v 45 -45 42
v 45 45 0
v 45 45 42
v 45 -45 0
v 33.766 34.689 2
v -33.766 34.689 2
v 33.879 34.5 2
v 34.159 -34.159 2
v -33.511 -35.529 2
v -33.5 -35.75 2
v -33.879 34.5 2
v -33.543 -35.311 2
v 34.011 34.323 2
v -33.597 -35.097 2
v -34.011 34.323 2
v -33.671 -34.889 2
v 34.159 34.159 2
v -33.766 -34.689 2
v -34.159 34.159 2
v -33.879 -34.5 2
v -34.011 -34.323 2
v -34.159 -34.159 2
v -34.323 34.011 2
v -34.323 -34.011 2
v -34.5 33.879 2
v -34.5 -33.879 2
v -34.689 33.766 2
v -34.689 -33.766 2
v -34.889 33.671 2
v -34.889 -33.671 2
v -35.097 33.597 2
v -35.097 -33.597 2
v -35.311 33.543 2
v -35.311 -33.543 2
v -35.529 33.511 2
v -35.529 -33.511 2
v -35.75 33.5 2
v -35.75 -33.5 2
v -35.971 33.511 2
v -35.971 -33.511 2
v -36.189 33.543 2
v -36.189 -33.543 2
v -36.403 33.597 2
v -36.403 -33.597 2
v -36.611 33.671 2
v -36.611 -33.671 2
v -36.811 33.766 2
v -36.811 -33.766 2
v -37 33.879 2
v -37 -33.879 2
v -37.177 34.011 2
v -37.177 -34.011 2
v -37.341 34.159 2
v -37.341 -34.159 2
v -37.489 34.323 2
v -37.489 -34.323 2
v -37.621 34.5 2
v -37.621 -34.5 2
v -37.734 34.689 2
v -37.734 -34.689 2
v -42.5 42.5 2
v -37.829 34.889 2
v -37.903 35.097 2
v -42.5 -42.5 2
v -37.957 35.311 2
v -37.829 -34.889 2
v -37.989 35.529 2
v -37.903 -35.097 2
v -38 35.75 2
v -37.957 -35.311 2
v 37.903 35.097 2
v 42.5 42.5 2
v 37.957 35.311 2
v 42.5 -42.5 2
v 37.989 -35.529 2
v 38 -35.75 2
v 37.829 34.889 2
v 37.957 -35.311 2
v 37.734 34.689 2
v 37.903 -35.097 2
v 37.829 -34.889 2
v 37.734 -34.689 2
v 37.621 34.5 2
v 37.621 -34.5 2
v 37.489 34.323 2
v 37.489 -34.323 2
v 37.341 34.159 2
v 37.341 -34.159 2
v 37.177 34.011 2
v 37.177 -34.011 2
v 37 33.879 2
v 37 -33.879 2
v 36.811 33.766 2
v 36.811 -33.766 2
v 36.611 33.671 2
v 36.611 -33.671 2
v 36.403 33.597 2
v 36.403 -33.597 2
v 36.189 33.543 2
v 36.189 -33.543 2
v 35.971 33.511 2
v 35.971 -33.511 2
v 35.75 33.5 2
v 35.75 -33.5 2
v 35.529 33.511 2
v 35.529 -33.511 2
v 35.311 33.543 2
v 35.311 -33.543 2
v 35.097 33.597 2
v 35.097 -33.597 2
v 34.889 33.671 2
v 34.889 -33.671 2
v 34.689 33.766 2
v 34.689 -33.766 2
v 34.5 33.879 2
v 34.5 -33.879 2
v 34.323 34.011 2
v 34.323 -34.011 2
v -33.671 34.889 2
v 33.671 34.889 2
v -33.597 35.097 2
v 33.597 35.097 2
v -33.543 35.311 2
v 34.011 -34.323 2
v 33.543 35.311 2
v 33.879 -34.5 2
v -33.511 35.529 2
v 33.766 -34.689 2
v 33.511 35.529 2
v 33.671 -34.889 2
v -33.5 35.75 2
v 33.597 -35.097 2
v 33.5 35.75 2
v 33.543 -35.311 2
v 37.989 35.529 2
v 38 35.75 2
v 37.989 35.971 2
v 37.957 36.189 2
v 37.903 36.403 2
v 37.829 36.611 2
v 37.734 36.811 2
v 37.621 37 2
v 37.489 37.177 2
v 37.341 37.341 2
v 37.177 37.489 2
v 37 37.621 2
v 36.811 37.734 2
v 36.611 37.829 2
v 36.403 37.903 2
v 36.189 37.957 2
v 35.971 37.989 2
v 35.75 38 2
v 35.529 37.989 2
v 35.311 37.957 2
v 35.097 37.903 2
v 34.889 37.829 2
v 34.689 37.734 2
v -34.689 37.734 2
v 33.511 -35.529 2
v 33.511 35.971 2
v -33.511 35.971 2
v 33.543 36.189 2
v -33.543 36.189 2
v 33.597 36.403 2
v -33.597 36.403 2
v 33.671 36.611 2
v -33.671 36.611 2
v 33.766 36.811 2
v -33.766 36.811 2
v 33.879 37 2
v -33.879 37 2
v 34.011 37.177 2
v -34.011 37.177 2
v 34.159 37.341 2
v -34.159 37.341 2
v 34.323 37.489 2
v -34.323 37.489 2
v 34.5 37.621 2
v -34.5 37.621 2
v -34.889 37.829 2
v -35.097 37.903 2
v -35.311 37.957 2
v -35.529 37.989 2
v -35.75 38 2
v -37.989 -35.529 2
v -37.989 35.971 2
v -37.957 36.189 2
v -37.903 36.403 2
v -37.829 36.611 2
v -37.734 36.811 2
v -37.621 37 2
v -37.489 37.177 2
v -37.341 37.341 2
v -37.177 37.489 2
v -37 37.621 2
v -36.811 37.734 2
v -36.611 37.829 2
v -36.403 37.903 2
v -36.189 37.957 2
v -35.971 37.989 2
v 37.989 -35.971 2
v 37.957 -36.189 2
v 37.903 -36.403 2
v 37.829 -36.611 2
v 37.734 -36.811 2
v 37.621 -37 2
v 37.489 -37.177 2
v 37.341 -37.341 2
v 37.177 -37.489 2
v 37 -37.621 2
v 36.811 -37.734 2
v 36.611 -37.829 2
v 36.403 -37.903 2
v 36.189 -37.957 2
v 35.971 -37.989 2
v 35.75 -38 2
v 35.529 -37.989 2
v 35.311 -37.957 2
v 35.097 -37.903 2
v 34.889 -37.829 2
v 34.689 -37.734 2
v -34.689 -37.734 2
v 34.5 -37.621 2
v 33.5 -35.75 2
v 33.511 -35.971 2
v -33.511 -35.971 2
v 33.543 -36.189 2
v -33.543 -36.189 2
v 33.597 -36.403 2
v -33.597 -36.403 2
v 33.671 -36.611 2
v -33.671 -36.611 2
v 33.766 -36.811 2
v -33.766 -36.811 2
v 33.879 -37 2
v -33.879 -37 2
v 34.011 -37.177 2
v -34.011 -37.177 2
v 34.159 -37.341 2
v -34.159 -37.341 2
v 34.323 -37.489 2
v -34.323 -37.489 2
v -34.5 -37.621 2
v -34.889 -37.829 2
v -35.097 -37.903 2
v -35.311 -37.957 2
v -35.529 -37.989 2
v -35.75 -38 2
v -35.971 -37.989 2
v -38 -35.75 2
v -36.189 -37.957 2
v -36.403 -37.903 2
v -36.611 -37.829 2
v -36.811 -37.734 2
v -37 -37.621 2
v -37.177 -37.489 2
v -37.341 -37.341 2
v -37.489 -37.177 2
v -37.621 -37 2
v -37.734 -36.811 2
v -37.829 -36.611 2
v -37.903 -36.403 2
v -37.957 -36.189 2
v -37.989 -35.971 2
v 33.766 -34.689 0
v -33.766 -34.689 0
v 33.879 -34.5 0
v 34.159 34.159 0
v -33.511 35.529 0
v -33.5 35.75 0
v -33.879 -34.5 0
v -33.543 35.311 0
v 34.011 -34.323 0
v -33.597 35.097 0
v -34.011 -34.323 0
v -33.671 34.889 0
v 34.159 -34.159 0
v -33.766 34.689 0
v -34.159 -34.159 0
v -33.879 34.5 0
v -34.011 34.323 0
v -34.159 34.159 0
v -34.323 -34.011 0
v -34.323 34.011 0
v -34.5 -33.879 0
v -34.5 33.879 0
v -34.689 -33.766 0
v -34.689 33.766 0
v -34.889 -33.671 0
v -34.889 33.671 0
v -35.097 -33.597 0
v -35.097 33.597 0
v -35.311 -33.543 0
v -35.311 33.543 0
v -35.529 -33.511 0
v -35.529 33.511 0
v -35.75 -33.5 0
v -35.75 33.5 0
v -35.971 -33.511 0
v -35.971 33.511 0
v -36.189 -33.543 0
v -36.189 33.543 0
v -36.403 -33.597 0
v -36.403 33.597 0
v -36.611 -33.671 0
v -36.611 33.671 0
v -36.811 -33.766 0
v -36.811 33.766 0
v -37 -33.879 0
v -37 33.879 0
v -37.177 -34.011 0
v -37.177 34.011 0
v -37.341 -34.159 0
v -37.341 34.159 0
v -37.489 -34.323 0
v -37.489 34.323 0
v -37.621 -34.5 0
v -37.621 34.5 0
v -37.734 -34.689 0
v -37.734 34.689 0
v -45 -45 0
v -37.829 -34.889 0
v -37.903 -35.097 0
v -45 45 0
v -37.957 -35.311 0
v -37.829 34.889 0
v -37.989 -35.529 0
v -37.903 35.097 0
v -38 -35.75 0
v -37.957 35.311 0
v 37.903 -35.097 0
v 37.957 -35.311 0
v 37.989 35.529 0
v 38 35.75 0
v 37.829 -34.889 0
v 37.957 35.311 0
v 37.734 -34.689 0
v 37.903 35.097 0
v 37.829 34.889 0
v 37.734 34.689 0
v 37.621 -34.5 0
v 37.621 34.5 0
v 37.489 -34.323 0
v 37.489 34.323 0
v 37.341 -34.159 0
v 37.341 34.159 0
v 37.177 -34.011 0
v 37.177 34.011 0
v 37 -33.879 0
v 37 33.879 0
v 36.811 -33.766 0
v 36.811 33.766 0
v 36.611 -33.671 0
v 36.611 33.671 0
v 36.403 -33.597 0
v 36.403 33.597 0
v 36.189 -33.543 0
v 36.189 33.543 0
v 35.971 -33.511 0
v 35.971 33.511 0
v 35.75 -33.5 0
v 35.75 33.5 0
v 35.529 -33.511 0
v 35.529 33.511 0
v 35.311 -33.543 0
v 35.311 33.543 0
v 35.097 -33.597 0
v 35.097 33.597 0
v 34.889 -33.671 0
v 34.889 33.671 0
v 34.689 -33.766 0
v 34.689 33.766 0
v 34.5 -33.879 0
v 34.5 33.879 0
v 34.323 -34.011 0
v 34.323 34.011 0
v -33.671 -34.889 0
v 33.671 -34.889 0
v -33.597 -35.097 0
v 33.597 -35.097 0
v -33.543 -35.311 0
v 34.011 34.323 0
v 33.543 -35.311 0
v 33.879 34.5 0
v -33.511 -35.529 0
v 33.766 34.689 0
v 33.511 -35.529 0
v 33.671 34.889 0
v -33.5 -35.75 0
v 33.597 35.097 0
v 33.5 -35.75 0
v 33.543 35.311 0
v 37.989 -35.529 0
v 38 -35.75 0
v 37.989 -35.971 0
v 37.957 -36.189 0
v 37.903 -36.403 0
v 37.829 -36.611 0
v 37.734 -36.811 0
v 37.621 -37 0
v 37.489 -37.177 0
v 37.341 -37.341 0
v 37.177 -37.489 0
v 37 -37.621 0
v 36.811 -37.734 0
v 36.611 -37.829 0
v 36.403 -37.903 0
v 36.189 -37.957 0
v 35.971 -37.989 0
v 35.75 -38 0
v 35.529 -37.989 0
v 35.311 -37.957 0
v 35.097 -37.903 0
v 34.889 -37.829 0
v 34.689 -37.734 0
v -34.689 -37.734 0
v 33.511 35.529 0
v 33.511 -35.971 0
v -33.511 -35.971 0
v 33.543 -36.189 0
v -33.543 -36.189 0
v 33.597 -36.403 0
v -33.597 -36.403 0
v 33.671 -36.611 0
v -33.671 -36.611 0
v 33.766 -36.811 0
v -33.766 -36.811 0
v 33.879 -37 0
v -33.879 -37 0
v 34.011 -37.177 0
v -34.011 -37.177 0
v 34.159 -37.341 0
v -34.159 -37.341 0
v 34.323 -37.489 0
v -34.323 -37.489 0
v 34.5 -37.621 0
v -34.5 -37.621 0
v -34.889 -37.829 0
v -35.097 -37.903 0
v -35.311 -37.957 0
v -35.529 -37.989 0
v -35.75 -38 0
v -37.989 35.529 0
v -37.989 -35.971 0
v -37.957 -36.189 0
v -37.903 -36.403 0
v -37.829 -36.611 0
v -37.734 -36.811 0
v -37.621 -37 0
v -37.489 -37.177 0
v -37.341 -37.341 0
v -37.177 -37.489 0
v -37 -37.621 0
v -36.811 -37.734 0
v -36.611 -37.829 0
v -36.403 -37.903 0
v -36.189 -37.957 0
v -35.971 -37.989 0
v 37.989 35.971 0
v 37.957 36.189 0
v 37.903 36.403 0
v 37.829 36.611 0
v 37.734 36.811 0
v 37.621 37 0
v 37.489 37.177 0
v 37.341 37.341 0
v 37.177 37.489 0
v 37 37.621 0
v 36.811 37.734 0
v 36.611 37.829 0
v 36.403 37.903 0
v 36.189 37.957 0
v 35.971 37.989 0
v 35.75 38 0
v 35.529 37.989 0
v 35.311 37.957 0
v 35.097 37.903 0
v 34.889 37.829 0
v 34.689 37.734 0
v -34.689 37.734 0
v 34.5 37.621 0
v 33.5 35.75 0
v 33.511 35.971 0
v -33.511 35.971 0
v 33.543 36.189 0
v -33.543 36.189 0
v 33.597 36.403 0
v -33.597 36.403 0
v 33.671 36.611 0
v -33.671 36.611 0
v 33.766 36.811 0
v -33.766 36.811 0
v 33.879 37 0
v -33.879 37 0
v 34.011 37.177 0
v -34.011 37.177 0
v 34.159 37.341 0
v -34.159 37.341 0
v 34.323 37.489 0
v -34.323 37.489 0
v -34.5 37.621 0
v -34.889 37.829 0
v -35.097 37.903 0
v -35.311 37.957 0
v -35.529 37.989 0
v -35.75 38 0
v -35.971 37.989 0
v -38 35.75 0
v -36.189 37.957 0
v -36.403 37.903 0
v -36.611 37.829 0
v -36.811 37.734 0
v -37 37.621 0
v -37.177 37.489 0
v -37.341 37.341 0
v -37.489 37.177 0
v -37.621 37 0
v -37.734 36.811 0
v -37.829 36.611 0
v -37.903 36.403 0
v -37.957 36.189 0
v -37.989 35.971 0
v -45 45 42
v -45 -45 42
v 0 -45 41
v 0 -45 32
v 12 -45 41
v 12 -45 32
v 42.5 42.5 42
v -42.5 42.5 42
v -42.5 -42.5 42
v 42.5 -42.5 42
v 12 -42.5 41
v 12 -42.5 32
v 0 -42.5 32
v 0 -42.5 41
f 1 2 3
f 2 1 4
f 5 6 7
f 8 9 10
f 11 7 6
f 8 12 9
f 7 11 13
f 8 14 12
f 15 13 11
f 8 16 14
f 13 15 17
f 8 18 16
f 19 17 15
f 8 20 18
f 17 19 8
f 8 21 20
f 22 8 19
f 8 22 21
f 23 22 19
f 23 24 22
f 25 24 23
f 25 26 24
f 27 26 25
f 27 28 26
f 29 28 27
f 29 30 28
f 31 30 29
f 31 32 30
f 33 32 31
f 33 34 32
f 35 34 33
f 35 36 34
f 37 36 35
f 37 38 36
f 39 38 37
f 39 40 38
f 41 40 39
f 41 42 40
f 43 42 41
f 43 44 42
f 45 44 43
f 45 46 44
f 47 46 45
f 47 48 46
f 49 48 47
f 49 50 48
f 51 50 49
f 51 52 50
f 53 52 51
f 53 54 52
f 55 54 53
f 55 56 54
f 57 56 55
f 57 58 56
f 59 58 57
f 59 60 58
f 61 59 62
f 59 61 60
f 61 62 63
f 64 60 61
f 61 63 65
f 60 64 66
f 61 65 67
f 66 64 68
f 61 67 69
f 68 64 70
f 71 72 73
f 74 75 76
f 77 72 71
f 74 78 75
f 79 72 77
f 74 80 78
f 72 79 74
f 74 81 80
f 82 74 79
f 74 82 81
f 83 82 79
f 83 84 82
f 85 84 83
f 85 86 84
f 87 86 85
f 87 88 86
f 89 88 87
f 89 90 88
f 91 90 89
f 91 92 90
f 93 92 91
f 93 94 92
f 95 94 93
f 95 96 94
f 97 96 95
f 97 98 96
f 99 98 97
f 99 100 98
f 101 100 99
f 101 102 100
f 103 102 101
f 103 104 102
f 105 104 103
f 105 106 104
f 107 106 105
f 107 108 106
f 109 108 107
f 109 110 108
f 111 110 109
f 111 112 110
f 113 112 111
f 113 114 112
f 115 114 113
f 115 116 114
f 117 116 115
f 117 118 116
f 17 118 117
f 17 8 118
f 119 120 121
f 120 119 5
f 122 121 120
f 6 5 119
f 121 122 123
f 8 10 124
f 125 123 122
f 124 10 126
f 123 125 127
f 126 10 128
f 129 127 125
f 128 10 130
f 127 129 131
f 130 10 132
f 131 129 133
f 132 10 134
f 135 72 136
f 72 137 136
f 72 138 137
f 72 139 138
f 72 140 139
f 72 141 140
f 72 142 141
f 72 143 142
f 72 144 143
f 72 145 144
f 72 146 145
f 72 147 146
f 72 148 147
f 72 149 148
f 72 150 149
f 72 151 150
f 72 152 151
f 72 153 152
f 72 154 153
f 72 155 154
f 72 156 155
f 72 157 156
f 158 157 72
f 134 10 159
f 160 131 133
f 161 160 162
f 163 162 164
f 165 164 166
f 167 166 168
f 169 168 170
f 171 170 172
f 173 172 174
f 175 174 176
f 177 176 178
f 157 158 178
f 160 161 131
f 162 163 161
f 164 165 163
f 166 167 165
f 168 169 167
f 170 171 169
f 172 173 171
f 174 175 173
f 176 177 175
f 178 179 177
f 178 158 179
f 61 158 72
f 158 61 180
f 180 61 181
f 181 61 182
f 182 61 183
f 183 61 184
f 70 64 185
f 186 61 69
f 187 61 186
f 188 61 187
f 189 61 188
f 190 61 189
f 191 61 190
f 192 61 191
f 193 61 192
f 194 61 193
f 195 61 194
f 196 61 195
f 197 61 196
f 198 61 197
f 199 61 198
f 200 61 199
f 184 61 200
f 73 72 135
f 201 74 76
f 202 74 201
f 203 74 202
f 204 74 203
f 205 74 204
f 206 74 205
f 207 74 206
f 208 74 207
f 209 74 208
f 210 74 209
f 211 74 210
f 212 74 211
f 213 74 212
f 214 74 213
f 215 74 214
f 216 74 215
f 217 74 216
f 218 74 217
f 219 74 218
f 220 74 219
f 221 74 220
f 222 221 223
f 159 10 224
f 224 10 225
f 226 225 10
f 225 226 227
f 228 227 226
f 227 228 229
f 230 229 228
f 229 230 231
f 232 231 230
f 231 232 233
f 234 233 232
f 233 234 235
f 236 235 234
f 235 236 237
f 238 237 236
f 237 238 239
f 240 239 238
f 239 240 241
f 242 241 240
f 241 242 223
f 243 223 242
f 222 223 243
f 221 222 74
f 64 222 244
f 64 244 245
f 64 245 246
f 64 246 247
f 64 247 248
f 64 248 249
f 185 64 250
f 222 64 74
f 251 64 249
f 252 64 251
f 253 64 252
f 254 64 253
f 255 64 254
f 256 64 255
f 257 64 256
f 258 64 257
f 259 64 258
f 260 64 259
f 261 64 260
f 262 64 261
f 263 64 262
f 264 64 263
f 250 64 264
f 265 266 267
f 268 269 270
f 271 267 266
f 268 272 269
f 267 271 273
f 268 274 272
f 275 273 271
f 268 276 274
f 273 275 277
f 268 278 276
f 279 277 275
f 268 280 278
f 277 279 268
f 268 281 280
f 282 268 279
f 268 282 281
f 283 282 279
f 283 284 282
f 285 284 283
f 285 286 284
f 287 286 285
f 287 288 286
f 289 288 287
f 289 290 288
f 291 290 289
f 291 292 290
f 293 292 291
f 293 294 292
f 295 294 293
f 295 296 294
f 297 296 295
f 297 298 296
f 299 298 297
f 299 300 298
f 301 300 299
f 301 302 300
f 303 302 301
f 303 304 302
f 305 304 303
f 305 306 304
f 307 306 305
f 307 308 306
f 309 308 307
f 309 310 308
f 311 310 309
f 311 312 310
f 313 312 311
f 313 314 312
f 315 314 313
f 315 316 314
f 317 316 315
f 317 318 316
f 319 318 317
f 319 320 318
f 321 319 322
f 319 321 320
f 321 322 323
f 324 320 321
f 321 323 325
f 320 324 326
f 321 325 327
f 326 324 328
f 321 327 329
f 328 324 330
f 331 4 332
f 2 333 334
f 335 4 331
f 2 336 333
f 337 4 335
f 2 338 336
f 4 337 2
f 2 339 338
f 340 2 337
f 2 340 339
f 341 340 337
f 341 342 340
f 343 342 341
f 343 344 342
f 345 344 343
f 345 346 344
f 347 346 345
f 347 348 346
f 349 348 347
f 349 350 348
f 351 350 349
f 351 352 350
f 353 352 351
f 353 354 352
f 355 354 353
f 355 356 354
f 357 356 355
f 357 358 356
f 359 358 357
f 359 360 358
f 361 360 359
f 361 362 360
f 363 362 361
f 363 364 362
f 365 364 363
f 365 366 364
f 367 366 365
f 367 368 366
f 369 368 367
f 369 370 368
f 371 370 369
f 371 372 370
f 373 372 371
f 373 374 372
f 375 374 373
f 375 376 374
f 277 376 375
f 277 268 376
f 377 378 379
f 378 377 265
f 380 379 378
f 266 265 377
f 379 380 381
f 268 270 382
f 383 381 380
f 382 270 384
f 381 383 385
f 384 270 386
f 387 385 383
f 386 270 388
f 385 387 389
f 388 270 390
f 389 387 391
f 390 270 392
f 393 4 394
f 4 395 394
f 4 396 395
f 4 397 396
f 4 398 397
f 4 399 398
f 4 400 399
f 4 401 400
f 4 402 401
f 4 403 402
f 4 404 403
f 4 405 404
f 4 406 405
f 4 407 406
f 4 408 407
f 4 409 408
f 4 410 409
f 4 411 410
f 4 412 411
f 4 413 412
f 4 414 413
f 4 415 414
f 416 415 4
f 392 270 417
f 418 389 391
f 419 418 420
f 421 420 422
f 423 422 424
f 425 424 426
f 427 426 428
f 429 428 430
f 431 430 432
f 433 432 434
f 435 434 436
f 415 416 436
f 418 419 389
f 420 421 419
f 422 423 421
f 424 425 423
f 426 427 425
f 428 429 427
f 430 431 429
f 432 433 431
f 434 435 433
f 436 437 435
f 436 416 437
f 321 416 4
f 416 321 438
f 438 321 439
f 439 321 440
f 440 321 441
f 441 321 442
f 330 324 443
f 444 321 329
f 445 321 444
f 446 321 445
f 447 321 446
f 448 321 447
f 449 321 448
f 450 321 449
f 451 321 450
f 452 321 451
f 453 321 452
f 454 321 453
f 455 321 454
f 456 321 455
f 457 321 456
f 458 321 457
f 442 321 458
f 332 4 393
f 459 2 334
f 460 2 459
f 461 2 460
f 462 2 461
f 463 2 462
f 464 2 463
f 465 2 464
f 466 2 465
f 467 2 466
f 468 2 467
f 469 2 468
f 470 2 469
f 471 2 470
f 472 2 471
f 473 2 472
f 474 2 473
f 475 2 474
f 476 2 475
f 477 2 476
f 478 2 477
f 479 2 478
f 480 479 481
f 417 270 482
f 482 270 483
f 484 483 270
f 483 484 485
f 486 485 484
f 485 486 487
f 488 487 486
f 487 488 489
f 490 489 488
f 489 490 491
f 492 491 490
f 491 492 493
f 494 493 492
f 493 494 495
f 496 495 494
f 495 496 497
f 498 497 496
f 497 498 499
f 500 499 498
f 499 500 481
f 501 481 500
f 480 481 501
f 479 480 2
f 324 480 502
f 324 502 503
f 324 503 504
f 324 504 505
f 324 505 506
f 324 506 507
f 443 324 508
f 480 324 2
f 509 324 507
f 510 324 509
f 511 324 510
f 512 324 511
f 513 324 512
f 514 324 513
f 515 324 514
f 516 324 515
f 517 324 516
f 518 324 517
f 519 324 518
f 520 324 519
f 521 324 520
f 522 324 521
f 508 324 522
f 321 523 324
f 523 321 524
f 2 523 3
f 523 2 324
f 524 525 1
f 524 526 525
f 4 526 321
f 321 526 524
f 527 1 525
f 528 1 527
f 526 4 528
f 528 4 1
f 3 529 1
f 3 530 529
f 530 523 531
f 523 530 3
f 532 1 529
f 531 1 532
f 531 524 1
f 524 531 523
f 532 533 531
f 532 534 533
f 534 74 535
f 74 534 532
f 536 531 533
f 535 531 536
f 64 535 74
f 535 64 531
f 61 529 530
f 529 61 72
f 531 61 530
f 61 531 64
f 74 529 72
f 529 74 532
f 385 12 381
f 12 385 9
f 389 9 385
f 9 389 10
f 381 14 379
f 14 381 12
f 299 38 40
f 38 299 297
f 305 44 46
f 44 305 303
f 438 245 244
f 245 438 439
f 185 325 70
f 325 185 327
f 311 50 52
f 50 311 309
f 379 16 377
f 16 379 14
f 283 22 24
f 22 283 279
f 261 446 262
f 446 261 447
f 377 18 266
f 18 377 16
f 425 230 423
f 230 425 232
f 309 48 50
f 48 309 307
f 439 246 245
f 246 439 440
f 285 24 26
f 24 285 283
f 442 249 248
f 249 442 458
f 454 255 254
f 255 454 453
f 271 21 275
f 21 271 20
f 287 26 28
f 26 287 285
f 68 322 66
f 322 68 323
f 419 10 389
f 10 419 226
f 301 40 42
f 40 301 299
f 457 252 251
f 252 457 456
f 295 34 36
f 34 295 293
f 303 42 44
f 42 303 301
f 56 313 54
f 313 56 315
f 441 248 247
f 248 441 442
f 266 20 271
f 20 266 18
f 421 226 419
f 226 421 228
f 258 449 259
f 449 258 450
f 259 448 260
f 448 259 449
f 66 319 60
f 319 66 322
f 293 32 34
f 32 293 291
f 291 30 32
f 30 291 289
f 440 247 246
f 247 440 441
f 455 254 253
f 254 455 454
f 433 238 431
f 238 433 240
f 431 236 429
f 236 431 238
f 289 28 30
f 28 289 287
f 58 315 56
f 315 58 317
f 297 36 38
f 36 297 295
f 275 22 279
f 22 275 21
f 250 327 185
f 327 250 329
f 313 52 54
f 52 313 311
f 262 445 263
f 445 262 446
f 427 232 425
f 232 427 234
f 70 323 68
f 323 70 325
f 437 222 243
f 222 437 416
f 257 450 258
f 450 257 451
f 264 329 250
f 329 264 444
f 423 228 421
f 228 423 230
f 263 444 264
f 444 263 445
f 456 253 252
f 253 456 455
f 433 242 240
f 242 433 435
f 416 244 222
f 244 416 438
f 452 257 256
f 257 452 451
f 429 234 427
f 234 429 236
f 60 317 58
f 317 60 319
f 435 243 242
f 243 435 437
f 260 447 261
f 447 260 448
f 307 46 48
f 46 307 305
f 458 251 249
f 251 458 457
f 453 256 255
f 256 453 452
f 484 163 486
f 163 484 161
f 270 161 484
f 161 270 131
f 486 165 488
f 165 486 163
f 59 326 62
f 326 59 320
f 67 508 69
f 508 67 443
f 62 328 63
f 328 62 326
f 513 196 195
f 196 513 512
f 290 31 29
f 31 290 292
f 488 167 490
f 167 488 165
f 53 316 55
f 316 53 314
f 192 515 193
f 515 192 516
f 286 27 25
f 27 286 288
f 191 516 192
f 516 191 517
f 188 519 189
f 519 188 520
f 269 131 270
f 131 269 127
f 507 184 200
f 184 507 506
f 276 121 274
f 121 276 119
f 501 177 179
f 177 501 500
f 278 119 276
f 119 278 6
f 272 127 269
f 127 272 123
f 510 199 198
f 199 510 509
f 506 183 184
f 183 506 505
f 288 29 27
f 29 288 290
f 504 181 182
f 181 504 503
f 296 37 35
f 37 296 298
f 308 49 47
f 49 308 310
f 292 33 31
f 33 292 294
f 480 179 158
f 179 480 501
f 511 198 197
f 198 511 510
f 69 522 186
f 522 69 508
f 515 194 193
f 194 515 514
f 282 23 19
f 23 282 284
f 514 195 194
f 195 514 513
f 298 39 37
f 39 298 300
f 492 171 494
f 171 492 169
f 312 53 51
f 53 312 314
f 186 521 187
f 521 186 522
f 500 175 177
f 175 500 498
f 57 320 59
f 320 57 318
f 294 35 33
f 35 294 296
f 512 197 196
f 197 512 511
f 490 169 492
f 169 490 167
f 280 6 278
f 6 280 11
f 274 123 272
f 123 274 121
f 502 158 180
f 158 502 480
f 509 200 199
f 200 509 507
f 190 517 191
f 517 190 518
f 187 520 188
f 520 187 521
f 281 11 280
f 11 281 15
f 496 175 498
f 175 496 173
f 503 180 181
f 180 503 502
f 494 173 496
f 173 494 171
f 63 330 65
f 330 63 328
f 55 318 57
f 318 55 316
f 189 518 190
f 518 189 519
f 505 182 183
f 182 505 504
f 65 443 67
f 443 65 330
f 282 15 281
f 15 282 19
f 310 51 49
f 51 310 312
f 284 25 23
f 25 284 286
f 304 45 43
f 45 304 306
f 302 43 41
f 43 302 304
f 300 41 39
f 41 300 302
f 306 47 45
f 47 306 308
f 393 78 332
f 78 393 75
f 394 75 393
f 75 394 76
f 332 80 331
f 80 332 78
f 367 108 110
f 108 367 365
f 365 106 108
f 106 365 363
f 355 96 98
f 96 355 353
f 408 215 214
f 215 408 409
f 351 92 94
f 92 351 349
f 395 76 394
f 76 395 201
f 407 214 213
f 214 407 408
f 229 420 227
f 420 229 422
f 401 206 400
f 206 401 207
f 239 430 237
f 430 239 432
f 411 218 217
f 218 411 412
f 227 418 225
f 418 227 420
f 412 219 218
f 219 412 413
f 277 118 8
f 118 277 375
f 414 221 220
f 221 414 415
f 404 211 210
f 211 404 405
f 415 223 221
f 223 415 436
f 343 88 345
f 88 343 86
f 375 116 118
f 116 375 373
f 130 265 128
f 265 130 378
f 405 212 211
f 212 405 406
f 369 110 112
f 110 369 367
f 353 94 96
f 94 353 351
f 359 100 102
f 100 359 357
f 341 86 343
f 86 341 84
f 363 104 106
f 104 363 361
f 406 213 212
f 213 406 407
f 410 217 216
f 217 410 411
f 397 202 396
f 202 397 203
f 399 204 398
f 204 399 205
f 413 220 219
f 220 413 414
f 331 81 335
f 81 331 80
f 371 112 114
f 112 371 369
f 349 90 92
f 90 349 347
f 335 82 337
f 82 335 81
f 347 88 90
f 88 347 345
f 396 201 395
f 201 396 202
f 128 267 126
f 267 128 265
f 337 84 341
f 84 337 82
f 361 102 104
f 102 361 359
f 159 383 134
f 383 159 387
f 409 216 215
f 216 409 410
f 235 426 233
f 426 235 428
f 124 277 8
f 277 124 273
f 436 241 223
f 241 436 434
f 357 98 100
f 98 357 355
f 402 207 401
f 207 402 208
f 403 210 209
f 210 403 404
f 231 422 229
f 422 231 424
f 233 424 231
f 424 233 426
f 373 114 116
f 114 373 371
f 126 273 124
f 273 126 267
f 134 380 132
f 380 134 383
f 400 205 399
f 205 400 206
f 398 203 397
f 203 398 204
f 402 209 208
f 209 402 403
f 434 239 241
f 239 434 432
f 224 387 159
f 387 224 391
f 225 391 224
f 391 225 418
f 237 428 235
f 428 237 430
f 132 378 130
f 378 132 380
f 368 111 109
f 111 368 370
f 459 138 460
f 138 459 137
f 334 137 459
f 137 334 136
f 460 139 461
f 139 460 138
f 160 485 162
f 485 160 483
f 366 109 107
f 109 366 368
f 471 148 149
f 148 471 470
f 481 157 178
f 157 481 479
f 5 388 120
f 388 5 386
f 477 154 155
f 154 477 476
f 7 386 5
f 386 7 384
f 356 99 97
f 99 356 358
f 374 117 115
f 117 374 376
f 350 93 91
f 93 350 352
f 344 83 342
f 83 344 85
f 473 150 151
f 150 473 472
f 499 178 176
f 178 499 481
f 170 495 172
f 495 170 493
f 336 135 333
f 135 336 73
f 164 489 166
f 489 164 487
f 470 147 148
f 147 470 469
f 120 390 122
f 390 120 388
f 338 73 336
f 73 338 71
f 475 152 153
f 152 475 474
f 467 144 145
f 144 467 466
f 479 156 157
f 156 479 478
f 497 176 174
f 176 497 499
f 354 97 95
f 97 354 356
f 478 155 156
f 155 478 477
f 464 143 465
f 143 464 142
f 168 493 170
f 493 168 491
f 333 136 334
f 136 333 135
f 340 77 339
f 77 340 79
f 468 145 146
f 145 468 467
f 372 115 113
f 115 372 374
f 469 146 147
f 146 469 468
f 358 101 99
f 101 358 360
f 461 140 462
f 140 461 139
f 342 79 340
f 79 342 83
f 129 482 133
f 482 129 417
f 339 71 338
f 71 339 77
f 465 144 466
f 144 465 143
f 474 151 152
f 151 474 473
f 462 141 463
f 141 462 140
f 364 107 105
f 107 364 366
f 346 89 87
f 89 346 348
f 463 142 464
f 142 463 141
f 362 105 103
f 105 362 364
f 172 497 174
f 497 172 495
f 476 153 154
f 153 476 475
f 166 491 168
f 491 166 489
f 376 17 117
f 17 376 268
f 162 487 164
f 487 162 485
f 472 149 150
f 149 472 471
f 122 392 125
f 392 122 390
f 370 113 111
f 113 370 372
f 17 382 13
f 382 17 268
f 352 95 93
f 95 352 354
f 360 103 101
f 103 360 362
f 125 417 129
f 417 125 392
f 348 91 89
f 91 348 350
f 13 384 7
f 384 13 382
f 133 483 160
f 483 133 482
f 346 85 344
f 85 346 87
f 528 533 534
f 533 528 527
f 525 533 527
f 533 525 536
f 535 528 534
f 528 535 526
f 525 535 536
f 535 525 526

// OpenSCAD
// DIY magnetic stirrer housing for an 80 mm PC case fan.
// Modelled in print orientation: the 2 mm top plate (stirring surface)
// lies flat on the bed (z = 0..2) and the four 2.5 mm walls rise to z = 40,
// leaving the box open at the top.

// ---- Dimensions (mm) ----
outer_x   = 90;   // outer size along X
outer_y   = 90;   // outer size along Y
wall_t    = 2.5;  // wall thickness
top_t     = 2;    // top plate thickness (stirring surface)
wall_h    = 40;   // wall height above the top plate (open edge at z = 40)

hole_d    = 4.5;  // M4 clearance hole diameter
hole_pitch= 71.5; // square pitch of the four mounting holes (centred)

notch_w   = 12;   // power-cable notch width
notch_top = 40;   // notch reaches the open edge
notch_bot = 32;   // notch bottom (8 mm down from the open edge)

$fn = 64;         // smooth round holes

// ---- Base: top plate + four walls (open box, printed upside down) ----
module base() { union() {
    // top plate on the bed
    translate([-outer_x/2, -outer_y/2, 0])
        cube([outer_x, outer_y, top_t]);

    // four walls rising from the top plate
    // front wall (negative Y side)
    translate([-outer_x/2, -outer_y/2, top_t])
        cube([outer_x, wall_t, wall_h]);
    // back wall (positive Y side)
    translate([-outer_x/2, outer_y/2 - wall_t, top_t])
        cube([outer_x, wall_t, wall_h]);
    // left wall (negative X side)
    translate([-outer_x/2, -outer_y/2 + wall_t, top_t])
        cube([wall_t, outer_y - 2*wall_t, wall_h]);
    // right wall (positive X side)
    translate([outer_x/2 - wall_t, -outer_y/2 + wall_t, top_t])
        cube([wall_t, outer_y - 2*wall_t, wall_h]);
} }

// ---- Cutters ----
// four M4 mounting holes through the top plate (71.5 mm square, centred)
module mounting_holes() { for (dx = [-hole_pitch/2, hole_pitch/2],
                      dy = [-hole_pitch/2, hole_pitch/2])
    translate([dx, dy, -1])
        cylinder(h = top_t + 2, r = hole_d/2, $fn = $fn); }

// power-cable notch in one wall (front wall, centred along it)
module cable_notch() { translate([0, -outer_y/2 - 1, notch_bot])
    cube([notch_w, wall_t + 2, notch_top - notch_bot + 1]); }

// ---- Final part ----
difference() {
    base();
    mounting_holes();
    cable_notch();
}
